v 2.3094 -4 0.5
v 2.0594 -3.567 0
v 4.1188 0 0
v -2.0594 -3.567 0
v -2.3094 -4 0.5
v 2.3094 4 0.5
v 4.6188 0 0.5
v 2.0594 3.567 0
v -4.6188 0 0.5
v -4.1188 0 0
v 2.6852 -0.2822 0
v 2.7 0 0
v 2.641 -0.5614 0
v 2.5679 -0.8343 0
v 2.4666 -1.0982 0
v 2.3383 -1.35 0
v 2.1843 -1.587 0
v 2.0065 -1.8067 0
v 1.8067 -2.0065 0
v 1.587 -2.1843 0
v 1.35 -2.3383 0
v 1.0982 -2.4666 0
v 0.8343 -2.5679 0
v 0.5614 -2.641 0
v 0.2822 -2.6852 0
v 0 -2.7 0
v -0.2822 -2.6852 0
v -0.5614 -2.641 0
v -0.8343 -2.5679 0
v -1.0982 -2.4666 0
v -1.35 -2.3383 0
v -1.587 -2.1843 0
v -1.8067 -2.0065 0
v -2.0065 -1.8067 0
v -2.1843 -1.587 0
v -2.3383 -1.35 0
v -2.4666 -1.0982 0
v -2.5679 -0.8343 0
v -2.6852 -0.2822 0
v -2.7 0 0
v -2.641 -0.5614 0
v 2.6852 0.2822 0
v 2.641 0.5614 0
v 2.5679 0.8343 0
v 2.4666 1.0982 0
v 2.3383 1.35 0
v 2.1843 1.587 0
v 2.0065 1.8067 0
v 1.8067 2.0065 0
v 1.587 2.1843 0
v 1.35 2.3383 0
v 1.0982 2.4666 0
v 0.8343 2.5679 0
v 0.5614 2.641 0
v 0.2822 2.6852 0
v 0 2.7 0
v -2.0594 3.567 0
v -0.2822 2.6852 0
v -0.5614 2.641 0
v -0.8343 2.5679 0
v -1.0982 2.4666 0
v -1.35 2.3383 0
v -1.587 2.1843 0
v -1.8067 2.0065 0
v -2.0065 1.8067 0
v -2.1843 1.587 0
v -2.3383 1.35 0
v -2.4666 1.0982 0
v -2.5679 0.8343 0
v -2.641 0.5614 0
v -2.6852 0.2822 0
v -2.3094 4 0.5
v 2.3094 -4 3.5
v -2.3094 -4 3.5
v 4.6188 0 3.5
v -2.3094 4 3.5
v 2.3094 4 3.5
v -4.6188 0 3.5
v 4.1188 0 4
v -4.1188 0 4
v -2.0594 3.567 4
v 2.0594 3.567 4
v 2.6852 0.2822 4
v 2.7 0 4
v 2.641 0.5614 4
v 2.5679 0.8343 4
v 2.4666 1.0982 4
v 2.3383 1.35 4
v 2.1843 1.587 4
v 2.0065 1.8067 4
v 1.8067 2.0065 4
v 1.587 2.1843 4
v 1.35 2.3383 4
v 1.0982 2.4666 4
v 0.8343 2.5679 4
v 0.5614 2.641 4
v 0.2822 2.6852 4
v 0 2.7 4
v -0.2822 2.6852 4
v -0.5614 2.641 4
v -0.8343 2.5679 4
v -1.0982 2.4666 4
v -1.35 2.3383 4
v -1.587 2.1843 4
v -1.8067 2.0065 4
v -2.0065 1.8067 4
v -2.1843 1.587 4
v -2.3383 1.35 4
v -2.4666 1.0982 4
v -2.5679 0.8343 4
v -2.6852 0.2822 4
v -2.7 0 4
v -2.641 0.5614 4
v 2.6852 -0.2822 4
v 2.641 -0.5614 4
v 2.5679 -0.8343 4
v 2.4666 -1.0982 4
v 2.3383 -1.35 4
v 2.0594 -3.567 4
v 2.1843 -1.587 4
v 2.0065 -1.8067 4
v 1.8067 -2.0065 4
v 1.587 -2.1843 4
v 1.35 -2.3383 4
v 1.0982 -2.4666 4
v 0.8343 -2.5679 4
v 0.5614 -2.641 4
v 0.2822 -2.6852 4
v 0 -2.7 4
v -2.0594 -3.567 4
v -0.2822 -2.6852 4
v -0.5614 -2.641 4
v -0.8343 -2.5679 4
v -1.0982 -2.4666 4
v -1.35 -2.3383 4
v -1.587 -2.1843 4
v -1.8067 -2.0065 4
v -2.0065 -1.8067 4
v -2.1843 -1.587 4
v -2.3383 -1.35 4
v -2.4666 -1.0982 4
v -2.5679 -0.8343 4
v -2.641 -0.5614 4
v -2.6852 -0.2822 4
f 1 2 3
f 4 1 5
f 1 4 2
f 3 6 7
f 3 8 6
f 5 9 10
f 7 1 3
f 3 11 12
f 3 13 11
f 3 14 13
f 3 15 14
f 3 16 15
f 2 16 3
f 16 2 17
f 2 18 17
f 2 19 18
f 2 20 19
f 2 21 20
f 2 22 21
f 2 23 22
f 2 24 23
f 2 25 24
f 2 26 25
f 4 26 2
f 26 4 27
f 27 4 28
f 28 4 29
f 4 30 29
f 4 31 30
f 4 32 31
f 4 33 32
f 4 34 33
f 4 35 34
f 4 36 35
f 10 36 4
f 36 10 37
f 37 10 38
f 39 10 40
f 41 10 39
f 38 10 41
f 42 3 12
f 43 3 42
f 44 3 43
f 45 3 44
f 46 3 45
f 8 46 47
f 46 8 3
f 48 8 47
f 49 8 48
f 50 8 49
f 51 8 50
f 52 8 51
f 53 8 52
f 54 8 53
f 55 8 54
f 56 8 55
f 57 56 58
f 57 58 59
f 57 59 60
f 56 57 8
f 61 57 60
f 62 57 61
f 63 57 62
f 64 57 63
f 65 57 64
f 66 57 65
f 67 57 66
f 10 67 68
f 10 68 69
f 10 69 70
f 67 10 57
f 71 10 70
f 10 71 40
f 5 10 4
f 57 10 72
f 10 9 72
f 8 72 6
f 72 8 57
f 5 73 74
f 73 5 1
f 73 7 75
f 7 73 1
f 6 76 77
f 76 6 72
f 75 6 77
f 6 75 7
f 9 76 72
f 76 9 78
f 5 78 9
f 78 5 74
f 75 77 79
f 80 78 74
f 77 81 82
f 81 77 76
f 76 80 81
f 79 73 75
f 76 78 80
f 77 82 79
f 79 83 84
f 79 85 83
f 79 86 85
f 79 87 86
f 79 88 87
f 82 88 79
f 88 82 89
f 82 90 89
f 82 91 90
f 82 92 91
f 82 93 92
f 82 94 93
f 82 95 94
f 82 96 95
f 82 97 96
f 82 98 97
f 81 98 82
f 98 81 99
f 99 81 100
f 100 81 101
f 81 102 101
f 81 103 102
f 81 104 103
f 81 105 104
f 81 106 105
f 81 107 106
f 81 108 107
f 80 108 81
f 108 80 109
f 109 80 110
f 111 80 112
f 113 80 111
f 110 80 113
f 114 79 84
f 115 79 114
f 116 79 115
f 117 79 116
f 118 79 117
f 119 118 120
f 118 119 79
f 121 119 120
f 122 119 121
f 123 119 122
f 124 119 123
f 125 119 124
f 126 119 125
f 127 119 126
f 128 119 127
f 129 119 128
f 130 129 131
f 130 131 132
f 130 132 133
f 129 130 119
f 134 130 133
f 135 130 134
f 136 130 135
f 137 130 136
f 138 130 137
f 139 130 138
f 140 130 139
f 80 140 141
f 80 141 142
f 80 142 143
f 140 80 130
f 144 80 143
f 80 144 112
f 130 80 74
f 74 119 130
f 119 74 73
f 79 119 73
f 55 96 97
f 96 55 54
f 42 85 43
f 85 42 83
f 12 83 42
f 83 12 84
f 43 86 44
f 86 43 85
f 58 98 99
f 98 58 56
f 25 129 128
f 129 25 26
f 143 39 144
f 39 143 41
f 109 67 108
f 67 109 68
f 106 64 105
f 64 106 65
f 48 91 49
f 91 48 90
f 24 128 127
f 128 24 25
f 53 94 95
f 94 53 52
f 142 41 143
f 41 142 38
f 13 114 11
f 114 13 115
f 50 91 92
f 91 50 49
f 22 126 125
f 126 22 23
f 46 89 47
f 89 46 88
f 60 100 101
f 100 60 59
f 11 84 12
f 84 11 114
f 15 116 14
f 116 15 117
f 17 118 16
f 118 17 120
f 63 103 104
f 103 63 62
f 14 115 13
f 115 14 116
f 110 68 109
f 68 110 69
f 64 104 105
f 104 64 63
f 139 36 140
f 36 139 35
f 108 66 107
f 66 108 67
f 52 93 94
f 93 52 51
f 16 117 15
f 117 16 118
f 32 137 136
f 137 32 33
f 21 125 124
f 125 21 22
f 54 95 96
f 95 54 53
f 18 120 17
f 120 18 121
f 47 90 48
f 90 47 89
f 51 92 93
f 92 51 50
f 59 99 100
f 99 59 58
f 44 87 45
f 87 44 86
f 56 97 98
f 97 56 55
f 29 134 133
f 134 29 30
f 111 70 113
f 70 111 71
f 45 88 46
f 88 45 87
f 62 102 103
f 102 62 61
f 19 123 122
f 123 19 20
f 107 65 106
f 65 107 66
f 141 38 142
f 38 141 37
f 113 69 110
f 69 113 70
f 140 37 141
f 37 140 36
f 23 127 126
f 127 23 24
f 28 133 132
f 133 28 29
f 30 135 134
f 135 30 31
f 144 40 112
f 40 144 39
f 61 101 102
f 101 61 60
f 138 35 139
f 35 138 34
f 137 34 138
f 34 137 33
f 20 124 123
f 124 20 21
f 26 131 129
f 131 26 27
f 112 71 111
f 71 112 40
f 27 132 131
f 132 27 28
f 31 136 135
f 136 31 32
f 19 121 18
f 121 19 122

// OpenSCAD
// Through hex nut.
$fn = 60;
eps = 0.02;
thread_clearance_d = 5.4;
flat = 8;
thickness = 4;
chamfer = 0.5;
difference() {
    union() {
        cylinder(d1 = flat / cos(30) - 2 * chamfer, d2 = flat / cos(30), h = chamfer, $fn = 6);
        translate([0, 0, chamfer]) cylinder(d = flat / cos(30), h = thickness - 2 * chamfer, $fn = 6);
        translate([0, 0, thickness - chamfer]) cylinder(d1 = flat / cos(30), d2 = flat / cos(30) - 2 * chamfer, h = chamfer, $fn = 6);
    }
    translate([0, 0, -eps]) cylinder(d = thread_clearance_d, h = thickness + 2 * eps);
}
